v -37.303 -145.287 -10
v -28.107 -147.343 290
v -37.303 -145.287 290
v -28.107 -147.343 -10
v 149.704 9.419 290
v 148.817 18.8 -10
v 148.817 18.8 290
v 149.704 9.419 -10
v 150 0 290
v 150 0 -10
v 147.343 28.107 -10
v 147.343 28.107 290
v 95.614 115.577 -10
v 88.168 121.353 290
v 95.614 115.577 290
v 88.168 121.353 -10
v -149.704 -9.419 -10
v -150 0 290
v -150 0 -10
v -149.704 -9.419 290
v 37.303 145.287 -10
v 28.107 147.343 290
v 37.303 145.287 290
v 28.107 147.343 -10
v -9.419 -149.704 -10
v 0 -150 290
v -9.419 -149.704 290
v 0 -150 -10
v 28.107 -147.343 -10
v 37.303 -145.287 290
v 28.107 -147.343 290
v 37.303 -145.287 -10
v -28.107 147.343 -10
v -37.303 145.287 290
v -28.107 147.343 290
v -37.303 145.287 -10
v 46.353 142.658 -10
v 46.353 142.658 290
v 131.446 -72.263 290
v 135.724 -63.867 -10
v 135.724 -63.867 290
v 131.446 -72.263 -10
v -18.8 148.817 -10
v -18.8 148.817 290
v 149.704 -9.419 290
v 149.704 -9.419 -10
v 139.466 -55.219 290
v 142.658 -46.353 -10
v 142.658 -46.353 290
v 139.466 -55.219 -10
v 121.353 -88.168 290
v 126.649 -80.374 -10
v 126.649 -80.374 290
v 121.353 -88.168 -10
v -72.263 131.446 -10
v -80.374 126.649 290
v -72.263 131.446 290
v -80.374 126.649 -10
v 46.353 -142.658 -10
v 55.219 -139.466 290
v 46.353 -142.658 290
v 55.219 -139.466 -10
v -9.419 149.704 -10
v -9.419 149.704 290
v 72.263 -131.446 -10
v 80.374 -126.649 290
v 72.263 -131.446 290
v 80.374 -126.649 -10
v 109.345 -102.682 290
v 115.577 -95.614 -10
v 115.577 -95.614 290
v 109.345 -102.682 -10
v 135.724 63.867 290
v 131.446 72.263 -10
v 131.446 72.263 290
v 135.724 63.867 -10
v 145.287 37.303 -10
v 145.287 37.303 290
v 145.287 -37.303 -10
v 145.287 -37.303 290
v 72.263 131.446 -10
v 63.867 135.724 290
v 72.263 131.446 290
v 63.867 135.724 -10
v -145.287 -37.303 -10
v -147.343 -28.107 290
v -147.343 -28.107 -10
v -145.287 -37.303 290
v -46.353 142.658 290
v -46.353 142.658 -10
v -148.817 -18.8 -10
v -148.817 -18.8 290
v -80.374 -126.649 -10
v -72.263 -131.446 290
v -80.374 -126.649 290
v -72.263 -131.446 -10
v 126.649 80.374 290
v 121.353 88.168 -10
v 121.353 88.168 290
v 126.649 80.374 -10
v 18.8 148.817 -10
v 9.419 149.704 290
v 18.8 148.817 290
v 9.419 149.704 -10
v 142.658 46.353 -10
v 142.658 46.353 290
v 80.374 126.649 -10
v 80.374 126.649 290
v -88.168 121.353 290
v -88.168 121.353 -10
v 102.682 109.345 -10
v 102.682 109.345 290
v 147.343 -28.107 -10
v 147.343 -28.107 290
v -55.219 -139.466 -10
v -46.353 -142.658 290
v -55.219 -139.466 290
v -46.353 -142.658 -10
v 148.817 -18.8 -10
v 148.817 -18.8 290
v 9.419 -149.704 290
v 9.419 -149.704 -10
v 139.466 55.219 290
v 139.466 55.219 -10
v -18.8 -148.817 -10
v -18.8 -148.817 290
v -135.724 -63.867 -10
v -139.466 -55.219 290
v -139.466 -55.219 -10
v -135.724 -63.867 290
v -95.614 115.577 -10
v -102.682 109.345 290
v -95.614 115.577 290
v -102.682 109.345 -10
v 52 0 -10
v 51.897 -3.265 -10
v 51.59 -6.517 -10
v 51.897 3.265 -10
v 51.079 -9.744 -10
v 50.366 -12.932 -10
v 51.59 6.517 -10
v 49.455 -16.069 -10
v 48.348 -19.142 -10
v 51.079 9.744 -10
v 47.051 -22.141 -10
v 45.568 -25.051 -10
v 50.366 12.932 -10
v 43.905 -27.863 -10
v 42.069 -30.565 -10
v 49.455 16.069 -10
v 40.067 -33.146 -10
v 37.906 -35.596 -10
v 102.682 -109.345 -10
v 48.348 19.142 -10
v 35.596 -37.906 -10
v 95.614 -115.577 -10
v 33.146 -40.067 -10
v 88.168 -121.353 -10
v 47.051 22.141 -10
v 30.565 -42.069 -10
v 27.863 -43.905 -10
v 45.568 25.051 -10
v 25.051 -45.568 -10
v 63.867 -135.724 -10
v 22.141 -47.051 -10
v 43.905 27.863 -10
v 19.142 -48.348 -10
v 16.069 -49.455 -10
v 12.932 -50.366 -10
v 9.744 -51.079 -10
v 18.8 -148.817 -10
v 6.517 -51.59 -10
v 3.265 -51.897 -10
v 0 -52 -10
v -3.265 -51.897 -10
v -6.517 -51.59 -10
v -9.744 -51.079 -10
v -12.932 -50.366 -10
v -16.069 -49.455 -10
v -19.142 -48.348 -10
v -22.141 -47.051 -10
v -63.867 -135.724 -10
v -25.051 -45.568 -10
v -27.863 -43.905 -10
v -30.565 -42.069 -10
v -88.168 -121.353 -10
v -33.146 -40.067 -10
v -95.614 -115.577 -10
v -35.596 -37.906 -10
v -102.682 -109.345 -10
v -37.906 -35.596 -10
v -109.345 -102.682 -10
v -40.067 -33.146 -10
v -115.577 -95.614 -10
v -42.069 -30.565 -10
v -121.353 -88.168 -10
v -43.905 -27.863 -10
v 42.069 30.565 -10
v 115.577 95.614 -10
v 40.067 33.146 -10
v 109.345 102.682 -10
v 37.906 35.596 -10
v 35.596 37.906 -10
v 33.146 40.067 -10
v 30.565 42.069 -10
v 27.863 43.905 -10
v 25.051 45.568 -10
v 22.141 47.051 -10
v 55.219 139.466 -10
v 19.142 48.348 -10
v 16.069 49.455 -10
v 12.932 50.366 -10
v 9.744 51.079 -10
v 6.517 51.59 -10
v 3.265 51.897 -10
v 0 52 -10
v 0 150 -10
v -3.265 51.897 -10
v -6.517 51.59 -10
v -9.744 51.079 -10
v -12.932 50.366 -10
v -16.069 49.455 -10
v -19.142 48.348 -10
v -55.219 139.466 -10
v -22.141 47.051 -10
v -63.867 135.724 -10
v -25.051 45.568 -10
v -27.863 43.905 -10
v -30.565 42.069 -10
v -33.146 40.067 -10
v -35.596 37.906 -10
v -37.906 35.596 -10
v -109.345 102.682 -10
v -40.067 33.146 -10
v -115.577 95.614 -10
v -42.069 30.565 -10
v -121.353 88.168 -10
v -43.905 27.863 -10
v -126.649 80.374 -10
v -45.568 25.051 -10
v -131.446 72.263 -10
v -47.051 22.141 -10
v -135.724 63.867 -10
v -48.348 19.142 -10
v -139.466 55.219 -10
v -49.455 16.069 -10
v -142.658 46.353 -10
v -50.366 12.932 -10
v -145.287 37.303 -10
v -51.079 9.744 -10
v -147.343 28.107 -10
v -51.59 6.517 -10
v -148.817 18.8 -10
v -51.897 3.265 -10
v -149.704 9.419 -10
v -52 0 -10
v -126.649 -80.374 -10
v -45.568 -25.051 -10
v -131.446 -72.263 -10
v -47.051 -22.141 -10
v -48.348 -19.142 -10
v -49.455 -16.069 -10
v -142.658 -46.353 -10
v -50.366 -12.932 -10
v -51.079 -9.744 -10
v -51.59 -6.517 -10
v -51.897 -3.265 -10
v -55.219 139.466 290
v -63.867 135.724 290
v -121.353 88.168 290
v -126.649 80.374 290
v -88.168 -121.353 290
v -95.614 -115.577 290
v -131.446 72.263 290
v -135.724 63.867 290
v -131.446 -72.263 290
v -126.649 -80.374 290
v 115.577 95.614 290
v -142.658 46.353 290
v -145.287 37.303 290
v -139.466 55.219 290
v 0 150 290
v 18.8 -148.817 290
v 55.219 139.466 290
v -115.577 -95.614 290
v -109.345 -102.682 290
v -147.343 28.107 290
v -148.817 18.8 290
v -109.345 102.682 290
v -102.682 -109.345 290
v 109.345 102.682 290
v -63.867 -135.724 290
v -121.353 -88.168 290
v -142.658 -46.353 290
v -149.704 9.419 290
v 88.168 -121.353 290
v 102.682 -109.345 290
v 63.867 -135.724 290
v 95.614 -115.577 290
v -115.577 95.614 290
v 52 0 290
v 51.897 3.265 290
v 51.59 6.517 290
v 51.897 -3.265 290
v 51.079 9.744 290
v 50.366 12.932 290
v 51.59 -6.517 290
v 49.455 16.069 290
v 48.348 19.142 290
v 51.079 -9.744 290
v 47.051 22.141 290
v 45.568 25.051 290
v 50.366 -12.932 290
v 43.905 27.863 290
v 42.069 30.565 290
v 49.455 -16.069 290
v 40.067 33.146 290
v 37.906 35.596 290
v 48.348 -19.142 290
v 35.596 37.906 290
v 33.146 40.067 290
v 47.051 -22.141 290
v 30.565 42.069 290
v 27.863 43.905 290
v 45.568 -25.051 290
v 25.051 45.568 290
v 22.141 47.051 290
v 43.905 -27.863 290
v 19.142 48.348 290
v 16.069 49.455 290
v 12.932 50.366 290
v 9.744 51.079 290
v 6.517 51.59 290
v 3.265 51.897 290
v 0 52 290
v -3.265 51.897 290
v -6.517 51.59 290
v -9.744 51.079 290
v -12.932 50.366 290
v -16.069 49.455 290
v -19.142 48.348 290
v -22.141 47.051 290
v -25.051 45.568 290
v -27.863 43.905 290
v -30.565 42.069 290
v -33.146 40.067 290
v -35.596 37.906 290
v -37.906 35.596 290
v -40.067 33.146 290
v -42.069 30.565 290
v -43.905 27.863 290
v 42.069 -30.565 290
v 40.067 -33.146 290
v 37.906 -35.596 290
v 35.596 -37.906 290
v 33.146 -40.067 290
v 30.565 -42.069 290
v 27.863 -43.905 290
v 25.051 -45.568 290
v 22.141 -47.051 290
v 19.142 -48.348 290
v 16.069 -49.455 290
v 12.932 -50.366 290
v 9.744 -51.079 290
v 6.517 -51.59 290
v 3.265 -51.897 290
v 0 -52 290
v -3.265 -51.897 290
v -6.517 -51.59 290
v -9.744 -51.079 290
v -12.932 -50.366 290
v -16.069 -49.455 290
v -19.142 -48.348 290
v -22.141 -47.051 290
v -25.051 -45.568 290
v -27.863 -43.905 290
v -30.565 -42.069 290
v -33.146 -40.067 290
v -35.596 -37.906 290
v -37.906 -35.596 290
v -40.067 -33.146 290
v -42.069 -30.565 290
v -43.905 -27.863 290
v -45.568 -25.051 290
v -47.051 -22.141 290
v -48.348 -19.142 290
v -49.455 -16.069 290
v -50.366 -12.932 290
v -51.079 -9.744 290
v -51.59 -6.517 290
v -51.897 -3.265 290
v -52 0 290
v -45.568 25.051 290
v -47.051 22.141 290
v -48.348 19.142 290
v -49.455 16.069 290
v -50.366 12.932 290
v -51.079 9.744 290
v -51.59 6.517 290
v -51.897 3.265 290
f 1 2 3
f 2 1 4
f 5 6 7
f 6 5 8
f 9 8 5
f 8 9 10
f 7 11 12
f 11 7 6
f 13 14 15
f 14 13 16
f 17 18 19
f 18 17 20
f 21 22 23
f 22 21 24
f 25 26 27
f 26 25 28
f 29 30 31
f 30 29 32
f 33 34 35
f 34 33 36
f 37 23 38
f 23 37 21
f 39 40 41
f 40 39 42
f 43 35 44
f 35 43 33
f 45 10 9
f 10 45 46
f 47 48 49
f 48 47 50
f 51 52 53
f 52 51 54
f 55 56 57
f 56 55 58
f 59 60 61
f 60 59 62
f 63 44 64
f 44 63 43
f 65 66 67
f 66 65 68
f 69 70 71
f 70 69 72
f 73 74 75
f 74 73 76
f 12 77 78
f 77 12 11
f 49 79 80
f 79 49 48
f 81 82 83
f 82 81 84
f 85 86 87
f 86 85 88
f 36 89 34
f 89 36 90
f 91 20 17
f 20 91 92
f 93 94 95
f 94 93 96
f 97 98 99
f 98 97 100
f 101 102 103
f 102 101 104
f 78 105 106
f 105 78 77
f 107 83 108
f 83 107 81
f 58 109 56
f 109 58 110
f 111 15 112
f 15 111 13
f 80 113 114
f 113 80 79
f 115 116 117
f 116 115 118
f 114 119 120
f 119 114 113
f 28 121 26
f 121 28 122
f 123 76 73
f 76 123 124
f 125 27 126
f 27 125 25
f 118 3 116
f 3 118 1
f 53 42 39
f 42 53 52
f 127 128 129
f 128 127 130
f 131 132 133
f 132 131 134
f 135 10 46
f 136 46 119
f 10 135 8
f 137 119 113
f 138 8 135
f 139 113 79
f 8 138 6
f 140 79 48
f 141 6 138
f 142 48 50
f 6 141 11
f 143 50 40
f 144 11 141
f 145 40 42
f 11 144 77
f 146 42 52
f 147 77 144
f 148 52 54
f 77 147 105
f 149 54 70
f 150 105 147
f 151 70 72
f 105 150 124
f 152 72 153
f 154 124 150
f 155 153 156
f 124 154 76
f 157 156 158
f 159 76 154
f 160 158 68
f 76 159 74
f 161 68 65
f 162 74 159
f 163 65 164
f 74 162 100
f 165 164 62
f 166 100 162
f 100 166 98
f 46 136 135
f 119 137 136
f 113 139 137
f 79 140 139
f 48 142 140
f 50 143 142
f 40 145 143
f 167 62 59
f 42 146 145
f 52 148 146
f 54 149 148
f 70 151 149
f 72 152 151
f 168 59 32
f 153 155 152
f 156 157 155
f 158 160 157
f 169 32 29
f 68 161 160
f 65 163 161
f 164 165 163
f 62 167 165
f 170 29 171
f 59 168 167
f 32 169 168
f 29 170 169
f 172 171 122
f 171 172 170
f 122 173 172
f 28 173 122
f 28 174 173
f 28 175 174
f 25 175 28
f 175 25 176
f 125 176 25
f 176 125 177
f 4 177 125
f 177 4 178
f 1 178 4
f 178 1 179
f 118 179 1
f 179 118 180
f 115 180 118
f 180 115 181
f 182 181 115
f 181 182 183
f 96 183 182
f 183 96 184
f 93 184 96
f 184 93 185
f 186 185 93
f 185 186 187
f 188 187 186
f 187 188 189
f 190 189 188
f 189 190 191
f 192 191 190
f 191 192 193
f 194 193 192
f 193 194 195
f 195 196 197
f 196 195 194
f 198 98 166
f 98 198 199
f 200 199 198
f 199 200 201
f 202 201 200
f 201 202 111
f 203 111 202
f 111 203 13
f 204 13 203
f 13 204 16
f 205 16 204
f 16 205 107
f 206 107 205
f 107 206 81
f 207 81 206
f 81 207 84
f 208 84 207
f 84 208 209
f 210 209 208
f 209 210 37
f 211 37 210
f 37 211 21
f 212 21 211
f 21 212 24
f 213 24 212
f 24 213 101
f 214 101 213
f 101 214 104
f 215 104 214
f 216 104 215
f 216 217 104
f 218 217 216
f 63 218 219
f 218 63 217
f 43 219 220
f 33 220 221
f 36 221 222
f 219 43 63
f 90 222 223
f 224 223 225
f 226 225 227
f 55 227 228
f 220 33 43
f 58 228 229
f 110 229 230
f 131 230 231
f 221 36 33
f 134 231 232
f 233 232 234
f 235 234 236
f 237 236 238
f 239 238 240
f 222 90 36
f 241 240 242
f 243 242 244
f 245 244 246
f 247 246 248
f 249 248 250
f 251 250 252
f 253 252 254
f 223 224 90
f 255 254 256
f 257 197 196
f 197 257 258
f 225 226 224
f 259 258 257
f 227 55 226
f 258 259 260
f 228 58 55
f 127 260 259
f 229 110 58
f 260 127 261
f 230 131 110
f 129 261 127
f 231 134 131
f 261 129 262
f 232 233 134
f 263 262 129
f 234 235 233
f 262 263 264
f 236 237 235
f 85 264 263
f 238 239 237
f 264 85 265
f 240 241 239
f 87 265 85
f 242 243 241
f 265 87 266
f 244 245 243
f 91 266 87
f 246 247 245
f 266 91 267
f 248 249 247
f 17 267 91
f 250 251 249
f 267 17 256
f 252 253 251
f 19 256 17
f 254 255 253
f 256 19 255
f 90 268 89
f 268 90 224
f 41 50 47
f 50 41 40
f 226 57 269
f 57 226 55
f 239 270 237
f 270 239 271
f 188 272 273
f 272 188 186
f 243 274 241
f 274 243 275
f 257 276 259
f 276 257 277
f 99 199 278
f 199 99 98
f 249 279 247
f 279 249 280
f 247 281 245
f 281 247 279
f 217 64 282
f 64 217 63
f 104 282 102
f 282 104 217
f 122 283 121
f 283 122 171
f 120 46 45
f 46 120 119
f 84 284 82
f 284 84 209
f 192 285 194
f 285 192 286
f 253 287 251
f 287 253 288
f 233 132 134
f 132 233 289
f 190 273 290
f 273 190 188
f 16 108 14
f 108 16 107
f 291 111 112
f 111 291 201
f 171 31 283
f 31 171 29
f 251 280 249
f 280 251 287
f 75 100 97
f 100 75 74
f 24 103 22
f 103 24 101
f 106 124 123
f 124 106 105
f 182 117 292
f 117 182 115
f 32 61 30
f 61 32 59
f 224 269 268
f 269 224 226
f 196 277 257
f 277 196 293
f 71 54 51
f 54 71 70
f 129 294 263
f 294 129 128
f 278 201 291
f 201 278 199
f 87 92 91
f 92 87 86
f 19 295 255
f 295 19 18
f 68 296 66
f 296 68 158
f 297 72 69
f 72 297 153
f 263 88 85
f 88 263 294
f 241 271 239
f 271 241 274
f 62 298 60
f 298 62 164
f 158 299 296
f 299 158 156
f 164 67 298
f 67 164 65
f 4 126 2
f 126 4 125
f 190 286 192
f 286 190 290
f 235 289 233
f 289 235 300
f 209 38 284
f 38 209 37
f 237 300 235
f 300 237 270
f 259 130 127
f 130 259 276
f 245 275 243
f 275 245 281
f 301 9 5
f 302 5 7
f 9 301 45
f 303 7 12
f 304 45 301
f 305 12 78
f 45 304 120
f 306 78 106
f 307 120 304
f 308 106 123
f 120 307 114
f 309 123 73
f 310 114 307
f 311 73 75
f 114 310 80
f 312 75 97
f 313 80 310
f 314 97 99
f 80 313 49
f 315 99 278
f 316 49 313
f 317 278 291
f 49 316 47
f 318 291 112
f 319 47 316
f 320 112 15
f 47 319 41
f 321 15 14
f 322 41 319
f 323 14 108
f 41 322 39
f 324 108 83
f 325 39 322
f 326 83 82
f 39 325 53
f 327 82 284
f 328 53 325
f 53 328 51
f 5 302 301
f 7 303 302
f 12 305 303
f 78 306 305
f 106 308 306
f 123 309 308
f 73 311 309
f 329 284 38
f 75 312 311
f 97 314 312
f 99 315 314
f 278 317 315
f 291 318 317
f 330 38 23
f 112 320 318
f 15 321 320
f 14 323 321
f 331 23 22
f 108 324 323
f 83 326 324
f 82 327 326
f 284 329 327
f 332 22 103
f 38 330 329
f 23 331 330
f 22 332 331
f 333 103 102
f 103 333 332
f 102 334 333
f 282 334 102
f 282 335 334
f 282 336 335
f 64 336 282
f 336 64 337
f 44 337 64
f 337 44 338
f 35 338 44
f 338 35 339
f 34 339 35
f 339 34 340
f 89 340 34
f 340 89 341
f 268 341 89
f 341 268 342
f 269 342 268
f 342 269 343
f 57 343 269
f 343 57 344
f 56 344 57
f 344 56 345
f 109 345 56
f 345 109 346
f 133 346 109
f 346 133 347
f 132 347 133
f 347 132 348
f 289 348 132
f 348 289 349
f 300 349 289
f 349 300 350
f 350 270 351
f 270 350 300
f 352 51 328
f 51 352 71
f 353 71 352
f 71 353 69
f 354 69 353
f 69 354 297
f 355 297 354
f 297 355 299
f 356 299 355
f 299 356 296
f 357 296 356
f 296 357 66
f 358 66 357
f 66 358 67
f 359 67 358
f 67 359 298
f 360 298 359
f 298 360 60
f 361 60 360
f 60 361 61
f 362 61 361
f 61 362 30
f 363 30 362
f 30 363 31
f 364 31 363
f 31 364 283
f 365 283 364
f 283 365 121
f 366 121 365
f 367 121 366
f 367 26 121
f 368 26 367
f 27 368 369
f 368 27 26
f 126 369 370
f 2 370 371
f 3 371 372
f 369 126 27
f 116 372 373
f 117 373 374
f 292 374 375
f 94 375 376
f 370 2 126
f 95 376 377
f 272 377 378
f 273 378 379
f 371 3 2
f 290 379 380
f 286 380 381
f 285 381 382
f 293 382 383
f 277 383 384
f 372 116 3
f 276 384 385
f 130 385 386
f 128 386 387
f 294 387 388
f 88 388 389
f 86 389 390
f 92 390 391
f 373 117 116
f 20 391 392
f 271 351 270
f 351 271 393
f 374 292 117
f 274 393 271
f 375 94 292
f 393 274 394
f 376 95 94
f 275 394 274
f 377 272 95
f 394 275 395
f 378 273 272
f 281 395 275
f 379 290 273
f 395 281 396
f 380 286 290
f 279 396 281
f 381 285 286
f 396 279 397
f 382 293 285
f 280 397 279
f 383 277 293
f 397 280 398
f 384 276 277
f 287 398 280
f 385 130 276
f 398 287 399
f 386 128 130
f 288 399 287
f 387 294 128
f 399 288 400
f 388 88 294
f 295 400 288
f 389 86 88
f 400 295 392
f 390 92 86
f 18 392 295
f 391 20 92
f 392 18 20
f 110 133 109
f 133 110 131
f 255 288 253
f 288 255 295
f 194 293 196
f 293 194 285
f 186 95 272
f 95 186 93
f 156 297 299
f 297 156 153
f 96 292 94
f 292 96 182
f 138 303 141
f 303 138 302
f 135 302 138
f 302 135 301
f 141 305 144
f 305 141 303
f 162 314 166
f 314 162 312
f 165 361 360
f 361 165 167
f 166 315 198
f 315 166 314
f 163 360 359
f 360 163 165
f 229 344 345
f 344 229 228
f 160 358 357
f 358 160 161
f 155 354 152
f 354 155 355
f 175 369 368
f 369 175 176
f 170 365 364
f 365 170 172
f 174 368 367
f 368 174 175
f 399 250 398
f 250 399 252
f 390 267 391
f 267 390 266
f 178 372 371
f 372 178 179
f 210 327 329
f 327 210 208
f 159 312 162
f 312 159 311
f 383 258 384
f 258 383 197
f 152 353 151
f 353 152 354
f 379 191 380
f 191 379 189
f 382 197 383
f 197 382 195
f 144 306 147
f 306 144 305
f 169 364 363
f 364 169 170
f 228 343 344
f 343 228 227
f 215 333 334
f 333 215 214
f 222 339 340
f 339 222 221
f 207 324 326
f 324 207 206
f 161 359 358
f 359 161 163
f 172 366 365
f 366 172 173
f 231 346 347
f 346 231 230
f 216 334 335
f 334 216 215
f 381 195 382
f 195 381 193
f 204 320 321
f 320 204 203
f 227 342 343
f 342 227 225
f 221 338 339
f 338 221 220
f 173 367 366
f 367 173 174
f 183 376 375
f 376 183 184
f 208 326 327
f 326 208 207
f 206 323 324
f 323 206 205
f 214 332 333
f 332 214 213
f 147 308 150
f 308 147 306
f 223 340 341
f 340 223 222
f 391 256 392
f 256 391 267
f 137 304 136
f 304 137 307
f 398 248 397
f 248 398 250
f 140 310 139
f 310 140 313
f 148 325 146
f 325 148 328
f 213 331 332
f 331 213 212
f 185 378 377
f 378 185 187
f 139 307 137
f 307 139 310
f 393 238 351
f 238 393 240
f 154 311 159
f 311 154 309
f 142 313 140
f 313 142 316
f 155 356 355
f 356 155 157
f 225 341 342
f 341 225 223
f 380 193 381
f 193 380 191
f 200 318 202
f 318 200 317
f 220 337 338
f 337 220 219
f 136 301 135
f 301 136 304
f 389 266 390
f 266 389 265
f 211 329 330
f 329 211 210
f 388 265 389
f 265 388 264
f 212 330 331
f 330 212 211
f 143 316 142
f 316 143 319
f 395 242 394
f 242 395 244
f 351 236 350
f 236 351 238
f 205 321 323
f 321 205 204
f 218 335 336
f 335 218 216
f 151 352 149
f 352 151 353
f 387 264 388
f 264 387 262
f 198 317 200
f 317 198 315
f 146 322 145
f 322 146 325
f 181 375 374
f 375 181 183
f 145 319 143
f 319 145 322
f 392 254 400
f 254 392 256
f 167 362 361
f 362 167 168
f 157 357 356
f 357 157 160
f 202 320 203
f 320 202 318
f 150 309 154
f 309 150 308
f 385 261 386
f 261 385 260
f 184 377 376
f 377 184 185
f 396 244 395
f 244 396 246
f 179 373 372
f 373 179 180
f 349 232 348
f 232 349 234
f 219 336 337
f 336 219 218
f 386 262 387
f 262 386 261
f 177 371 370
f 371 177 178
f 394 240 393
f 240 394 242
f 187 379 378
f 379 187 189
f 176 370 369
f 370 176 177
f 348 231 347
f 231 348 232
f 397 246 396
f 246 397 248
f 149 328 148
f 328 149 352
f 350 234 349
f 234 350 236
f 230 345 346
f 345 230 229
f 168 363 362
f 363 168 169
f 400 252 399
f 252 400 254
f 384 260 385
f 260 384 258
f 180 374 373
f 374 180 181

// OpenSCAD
module afdichting_mal() {
    difference() {
        translate([0, 0, -10])
        cylinder(h=300, r=300/2, $fn=100);

        translate([0, 0, -20])
            cylinder(h=2000, r=104/2, $fn=100);
    }
}

// Alleen tonen als je dit bestand zelfstandig opent
afdichting_mal();
